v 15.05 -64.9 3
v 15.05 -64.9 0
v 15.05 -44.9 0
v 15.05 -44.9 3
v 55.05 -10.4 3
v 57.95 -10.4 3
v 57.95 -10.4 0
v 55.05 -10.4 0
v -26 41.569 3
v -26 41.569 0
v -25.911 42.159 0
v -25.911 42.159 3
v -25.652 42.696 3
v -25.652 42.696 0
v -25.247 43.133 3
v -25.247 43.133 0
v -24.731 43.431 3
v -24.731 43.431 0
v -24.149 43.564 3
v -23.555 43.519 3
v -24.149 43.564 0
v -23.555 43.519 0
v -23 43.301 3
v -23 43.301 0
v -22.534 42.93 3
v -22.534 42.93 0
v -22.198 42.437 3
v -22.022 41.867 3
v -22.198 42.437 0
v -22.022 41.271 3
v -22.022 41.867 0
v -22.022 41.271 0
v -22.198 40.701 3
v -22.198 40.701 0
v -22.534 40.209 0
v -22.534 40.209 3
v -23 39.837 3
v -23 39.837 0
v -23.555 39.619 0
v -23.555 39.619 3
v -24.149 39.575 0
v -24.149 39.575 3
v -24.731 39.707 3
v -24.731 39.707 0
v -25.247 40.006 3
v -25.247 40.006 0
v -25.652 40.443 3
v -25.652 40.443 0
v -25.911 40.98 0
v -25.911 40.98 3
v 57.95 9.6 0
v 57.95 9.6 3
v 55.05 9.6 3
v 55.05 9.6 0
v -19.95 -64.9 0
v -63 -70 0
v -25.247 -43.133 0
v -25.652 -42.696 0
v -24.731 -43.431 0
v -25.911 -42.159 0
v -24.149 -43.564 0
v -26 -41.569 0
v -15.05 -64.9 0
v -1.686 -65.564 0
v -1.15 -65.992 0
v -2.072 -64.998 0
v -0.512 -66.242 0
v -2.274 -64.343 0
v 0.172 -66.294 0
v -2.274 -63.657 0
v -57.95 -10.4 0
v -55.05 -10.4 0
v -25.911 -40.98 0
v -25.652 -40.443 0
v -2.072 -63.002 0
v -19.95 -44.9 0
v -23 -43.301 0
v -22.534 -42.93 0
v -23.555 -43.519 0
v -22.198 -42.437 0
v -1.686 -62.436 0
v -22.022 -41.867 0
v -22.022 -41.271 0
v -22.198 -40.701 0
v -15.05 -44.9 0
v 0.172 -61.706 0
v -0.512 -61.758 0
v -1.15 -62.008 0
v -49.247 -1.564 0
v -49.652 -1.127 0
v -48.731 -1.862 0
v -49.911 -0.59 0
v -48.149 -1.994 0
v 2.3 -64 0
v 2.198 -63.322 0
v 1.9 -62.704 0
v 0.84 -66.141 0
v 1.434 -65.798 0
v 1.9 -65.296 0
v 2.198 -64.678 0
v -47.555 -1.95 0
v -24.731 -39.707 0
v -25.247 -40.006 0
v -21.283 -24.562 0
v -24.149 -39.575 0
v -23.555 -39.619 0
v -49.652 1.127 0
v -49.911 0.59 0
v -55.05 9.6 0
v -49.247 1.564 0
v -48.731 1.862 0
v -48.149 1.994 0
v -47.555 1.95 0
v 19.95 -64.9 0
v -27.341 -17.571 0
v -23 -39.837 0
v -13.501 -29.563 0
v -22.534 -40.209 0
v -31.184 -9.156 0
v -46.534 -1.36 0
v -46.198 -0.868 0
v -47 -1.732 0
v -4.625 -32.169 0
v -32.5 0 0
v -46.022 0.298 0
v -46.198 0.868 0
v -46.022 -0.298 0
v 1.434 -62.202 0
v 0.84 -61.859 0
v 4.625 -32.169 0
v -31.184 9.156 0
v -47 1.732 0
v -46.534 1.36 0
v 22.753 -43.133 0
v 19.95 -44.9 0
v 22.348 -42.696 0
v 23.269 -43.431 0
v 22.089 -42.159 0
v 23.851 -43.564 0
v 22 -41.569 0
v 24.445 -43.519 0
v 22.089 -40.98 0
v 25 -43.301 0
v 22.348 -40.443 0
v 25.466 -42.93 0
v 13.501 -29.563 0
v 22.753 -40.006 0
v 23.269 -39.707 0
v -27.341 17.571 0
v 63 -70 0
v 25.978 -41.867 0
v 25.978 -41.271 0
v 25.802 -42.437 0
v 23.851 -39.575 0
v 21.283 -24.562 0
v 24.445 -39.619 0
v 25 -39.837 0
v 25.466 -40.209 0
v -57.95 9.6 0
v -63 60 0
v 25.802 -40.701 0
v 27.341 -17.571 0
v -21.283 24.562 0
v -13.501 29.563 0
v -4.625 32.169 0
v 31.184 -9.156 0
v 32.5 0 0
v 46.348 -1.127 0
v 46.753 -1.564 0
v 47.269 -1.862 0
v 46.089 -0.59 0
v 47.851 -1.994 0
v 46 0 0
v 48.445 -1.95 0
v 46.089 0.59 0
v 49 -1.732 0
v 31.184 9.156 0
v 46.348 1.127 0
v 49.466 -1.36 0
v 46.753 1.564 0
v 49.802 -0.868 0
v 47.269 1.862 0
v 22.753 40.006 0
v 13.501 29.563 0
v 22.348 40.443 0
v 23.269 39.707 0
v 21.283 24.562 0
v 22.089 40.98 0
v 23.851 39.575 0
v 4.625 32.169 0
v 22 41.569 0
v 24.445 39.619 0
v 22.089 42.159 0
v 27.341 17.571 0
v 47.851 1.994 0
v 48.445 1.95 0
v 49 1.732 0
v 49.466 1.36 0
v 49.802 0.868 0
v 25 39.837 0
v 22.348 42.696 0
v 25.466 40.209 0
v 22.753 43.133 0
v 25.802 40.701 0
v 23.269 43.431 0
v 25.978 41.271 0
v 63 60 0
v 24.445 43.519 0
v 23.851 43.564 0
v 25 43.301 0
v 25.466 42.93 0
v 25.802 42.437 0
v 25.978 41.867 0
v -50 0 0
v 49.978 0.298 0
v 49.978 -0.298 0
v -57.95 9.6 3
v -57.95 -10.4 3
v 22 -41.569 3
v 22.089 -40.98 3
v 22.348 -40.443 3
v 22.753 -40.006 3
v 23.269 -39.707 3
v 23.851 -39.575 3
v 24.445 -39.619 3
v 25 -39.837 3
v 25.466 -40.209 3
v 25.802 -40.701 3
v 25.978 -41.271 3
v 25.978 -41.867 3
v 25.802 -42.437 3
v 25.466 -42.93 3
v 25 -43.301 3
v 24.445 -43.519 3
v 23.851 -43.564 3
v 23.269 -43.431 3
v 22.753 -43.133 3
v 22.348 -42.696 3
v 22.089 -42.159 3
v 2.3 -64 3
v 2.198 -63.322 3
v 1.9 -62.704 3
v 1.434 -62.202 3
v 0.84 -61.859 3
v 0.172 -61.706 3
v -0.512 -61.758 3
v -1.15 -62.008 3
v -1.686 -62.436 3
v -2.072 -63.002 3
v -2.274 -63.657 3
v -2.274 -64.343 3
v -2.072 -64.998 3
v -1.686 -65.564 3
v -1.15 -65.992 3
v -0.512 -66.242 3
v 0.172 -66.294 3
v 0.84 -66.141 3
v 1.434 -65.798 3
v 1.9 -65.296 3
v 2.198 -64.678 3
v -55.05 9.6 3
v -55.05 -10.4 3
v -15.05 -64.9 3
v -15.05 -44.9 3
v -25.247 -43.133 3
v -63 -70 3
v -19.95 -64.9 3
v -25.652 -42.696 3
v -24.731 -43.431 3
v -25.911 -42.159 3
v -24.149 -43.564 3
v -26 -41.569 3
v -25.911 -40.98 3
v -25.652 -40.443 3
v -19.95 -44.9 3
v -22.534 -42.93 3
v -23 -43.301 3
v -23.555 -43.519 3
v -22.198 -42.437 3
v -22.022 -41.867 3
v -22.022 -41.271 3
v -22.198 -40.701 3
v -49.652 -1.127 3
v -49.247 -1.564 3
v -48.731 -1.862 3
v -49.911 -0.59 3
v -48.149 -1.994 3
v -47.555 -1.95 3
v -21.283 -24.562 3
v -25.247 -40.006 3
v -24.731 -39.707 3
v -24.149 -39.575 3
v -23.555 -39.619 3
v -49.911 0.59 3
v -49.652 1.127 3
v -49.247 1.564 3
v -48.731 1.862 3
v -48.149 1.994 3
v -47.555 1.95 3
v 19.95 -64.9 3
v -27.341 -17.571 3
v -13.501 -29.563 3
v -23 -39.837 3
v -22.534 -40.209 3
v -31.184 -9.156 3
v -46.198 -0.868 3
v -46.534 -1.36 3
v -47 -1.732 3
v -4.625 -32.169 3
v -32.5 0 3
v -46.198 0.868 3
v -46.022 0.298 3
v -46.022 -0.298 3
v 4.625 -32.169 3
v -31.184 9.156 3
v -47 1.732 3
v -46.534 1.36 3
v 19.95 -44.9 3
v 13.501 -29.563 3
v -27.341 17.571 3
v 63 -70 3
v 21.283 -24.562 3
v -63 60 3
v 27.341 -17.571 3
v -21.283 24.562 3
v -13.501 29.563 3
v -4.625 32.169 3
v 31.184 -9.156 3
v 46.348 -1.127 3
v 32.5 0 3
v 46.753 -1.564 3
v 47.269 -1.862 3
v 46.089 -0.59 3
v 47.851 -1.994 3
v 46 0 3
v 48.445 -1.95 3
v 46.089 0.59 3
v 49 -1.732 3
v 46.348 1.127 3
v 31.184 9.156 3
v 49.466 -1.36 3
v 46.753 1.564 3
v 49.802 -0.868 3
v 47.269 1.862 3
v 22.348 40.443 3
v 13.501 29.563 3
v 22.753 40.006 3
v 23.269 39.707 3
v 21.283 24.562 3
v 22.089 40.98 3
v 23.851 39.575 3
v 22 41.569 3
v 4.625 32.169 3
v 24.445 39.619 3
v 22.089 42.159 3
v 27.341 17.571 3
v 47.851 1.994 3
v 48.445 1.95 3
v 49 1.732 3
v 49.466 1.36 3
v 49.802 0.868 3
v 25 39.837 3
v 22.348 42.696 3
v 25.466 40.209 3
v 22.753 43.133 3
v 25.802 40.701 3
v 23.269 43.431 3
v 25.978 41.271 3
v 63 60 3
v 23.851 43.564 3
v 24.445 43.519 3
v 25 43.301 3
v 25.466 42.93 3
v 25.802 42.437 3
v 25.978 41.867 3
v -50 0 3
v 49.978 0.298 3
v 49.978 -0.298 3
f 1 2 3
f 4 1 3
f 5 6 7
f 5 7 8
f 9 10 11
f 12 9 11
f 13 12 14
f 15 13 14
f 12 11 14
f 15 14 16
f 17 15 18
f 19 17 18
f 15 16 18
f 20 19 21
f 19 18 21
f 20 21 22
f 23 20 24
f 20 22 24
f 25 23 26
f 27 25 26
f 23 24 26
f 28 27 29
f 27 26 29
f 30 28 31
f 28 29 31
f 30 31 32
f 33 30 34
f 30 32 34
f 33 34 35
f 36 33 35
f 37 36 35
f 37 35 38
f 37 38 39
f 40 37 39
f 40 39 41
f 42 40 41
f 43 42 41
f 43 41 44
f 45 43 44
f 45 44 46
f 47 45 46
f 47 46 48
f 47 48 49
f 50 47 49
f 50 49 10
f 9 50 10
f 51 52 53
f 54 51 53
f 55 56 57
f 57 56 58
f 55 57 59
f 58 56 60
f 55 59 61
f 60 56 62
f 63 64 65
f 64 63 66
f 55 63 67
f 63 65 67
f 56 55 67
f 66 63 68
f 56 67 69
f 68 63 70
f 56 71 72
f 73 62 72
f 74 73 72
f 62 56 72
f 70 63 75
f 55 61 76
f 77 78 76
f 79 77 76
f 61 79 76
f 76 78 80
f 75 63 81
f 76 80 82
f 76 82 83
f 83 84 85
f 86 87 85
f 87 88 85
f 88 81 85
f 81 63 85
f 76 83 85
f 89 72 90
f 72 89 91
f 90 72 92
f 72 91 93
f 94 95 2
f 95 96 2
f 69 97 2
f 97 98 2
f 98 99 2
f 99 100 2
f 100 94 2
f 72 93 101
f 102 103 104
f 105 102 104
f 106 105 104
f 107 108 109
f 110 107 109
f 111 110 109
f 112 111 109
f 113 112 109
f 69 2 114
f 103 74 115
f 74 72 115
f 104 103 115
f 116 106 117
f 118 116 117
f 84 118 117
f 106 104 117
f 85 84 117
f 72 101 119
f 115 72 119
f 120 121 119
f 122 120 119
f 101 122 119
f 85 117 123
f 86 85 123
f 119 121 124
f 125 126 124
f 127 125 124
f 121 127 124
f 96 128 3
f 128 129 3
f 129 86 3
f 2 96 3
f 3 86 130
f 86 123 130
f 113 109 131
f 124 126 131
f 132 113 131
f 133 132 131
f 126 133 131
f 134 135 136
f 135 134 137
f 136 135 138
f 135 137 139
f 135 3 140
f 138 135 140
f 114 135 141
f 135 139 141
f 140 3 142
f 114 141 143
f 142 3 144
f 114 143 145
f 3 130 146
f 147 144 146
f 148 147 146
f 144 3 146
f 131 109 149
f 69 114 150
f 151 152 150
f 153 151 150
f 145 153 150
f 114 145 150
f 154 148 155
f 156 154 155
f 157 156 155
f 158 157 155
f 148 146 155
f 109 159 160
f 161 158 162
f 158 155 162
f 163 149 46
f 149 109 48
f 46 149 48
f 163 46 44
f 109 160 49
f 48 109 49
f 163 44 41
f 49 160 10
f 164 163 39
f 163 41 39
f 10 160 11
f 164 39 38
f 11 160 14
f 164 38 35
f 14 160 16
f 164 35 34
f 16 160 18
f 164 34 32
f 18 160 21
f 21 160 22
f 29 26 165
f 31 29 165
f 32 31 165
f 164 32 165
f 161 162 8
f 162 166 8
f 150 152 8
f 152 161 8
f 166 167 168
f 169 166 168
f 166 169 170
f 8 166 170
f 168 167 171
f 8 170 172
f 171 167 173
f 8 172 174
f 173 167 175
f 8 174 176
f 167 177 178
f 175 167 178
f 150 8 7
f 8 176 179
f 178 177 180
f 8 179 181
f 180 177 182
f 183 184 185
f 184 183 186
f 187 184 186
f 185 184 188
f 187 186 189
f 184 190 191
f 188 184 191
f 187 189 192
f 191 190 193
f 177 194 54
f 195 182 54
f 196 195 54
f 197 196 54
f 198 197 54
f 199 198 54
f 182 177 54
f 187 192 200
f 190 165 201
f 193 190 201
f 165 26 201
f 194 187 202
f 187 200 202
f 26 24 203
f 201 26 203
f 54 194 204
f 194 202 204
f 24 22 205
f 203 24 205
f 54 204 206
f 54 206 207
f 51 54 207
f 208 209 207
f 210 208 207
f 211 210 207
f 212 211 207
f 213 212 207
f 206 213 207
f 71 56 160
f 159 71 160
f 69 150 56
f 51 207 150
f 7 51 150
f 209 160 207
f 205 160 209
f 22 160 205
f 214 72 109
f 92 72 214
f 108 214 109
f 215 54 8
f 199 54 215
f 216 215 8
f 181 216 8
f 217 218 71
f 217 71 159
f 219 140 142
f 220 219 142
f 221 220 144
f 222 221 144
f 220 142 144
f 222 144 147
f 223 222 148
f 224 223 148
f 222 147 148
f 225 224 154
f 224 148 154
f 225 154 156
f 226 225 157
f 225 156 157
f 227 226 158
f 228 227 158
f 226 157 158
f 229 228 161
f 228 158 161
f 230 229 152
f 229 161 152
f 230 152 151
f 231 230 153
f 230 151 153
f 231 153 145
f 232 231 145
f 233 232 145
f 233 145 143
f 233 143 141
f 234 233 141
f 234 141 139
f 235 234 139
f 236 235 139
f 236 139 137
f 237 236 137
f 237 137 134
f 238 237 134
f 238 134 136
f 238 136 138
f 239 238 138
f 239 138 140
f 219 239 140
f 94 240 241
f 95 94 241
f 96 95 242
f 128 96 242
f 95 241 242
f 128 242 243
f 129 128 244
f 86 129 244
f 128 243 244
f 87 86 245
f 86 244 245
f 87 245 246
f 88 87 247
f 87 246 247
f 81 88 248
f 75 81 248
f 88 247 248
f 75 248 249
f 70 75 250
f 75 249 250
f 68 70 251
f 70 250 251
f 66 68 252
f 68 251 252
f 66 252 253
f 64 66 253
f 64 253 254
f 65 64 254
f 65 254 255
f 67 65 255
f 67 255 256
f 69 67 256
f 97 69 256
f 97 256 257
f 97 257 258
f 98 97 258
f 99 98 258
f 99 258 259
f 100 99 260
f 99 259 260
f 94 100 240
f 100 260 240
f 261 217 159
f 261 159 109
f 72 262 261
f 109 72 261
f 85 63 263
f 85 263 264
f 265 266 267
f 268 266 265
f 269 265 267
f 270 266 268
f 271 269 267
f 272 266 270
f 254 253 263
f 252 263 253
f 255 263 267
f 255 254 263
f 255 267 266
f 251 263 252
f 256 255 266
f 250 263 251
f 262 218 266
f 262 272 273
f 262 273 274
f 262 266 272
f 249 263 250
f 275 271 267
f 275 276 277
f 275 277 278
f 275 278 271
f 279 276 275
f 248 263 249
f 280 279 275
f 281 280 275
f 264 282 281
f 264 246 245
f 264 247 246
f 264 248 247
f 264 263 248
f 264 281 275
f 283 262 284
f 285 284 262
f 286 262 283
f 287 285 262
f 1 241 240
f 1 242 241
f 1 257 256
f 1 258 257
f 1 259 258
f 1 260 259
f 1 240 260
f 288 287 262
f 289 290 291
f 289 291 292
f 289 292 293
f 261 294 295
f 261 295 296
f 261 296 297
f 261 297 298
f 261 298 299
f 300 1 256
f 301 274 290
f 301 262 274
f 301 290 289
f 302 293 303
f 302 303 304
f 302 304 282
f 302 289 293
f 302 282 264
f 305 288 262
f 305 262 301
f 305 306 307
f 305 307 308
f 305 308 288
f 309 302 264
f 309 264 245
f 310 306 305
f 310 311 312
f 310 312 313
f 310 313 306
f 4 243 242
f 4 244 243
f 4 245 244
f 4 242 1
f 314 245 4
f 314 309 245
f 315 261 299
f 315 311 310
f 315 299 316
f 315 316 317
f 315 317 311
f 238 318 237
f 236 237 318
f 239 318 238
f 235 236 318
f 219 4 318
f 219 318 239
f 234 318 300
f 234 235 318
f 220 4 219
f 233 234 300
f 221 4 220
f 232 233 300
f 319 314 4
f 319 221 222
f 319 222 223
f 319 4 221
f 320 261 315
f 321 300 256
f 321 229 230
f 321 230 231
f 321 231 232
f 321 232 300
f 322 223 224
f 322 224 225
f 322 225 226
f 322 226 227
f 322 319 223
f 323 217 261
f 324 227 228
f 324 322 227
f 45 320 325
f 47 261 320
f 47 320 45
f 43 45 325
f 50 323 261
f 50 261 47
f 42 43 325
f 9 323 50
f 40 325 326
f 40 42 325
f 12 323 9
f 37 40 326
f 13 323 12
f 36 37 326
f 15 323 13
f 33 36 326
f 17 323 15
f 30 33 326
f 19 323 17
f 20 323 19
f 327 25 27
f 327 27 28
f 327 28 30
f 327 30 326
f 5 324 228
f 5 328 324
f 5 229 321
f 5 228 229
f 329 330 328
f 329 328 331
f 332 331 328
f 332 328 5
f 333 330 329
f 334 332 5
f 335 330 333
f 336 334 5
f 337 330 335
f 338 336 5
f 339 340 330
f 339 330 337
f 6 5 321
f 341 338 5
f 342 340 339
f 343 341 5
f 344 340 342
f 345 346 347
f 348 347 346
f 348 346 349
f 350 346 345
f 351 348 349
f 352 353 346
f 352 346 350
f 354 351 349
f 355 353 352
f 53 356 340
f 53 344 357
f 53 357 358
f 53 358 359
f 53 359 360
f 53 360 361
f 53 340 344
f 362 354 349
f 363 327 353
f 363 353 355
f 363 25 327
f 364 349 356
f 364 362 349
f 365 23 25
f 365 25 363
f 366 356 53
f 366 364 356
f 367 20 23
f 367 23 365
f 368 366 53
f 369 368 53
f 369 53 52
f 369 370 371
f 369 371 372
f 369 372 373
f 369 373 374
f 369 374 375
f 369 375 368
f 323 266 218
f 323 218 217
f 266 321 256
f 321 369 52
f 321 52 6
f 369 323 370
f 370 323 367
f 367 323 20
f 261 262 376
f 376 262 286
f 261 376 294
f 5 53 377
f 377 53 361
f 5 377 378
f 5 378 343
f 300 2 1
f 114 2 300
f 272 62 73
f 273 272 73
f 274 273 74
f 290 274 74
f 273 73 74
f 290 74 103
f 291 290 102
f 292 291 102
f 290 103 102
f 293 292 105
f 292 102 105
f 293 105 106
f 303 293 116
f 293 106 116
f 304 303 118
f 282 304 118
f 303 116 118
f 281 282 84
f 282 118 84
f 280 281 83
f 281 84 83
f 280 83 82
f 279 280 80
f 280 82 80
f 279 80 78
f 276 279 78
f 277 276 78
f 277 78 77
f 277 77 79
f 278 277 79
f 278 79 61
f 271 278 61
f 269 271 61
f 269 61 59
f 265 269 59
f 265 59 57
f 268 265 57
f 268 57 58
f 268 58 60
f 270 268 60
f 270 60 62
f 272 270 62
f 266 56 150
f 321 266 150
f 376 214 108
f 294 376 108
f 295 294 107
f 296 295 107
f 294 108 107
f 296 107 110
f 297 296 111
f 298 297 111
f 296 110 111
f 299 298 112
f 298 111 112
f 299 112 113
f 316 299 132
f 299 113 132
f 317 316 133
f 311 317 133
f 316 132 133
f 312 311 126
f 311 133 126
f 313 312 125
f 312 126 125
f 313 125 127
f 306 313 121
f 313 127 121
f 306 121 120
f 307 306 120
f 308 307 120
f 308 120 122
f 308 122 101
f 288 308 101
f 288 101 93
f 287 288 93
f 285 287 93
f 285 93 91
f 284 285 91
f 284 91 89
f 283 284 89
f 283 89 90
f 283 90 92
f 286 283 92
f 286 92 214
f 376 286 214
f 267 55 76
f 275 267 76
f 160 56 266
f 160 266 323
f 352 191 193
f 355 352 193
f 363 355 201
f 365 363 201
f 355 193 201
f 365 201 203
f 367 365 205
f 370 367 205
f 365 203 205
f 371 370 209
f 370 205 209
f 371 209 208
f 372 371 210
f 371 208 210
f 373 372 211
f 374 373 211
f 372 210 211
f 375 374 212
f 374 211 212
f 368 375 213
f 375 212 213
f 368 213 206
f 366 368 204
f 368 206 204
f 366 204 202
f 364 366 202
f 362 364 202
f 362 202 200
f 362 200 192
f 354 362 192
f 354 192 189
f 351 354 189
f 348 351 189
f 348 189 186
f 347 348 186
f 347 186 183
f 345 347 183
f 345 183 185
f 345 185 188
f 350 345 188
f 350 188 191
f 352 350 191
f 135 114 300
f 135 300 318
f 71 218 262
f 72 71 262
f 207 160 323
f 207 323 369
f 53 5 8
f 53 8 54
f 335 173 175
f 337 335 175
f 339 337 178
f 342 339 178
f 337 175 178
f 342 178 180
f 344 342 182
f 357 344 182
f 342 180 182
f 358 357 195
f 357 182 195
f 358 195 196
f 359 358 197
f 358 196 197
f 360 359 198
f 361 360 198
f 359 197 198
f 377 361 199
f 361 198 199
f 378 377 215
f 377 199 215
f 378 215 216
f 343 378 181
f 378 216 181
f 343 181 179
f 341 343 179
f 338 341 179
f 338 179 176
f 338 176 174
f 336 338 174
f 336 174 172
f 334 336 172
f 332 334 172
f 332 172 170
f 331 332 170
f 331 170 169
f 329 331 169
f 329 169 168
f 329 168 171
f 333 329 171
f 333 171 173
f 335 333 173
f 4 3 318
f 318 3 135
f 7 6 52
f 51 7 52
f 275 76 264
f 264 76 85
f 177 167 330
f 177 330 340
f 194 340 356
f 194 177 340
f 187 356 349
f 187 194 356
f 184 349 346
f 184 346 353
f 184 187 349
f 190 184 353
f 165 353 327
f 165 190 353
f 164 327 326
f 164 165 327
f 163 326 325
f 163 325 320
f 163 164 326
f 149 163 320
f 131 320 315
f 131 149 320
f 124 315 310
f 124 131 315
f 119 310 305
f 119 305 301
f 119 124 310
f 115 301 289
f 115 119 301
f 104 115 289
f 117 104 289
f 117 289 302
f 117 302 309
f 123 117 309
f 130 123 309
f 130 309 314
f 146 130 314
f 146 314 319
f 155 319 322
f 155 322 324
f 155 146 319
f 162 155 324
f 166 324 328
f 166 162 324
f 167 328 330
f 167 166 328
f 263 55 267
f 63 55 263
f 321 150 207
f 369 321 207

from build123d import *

# Parameters (mm, degrees)
SKETCH1_W                    = 126
SKETCH1_H                    = 130
SKETCH1_R                    = 32.5
SKETCH1_W_2                  = 4.9
SKETCH1_H_2                  = 20
BOSS_EXTRUDE1_DEPTH          = 3
SKETCH2_W                    = 2.9
SKETCH2_H                    = 20
CUT_EXTRUDE1_DEPTH           = 3
F_4_0_4_DIAMETER_HOLE1_D     = 4
F_4_0_4_DIAMETER_HOLE1_DEPTH = 10
F_4_0_4_DIAMETER_HOLE1_TIP   = 1.201721238
SKETCH6_R                    = 2.3
CUT_EXTRUDE2_DEPTH           = 3


with BuildPart() as part:
    # Sketch1 → Boss-Extrude1 (new body)
    with BuildSketch(Plane.XY):
        with Locations((0, -5)):
            Rectangle(SKETCH1_W, SKETCH1_H)
        Circle(SKETCH1_R, mode=Mode.SUBTRACT)
        with Locations((-17.5, -54.9)):
            Rectangle(SKETCH1_W_2, SKETCH1_H_2, mode=Mode.SUBTRACT)
        with Locations((17.5, -54.9)):
            Rectangle(SKETCH1_W_2, SKETCH1_H_2, mode=Mode.SUBTRACT)
    extrude(amount=BOSS_EXTRUDE1_DEPTH)

    # Sketch2 → Cut-Extrude1 (cut)
    with BuildSketch(Plane.XY.offset(3)):
        with Locations((-56.5, -0.4)):
            Rectangle(SKETCH2_W, SKETCH2_H)
    cut_extrude1 = extrude(amount=-CUT_EXTRUDE1_DEPTH, mode=Mode.SUBTRACT)

    # Mirror1: Cut-Extrude1 across plane
    add(cut_extrude1.mirror(Plane(origin=(0, 0, 0), x_dir=(0, 0, 1), z_dir=(1, 0, 0))), mode=Mode.SUBTRACT)

    # Ø4.0 (4) Diameter Hole1
    with Locations(Plane.XY.offset(3)):
        with Locations((-24, 41.569219382), (48, 0), (24, 41.569219382), (24, -41.569219382), (-24, -41.569219382), (-48, 0)):
            Hole(F_4_0_4_DIAMETER_HOLE1_D / 2, depth=F_4_0_4_DIAMETER_HOLE1_DEPTH)
            with Locations((0, 0, -(F_4_0_4_DIAMETER_HOLE1_DEPTH + F_4_0_4_DIAMETER_HOLE1_TIP / 2))):  # 118° drill point
                Cone(0, F_4_0_4_DIAMETER_HOLE1_D / 2, F_4_0_4_DIAMETER_HOLE1_TIP, mode=Mode.SUBTRACT)

    # Sketch6 → Cut-Extrude2 (cut)
    with BuildSketch(Plane.XY.offset(3)):
        with Locations((0, -64)):
            Circle(SKETCH6_R)
    extrude(amount=-CUT_EXTRUDE2_DEPTH, mode=Mode.SUBTRACT)


solid = part.part
